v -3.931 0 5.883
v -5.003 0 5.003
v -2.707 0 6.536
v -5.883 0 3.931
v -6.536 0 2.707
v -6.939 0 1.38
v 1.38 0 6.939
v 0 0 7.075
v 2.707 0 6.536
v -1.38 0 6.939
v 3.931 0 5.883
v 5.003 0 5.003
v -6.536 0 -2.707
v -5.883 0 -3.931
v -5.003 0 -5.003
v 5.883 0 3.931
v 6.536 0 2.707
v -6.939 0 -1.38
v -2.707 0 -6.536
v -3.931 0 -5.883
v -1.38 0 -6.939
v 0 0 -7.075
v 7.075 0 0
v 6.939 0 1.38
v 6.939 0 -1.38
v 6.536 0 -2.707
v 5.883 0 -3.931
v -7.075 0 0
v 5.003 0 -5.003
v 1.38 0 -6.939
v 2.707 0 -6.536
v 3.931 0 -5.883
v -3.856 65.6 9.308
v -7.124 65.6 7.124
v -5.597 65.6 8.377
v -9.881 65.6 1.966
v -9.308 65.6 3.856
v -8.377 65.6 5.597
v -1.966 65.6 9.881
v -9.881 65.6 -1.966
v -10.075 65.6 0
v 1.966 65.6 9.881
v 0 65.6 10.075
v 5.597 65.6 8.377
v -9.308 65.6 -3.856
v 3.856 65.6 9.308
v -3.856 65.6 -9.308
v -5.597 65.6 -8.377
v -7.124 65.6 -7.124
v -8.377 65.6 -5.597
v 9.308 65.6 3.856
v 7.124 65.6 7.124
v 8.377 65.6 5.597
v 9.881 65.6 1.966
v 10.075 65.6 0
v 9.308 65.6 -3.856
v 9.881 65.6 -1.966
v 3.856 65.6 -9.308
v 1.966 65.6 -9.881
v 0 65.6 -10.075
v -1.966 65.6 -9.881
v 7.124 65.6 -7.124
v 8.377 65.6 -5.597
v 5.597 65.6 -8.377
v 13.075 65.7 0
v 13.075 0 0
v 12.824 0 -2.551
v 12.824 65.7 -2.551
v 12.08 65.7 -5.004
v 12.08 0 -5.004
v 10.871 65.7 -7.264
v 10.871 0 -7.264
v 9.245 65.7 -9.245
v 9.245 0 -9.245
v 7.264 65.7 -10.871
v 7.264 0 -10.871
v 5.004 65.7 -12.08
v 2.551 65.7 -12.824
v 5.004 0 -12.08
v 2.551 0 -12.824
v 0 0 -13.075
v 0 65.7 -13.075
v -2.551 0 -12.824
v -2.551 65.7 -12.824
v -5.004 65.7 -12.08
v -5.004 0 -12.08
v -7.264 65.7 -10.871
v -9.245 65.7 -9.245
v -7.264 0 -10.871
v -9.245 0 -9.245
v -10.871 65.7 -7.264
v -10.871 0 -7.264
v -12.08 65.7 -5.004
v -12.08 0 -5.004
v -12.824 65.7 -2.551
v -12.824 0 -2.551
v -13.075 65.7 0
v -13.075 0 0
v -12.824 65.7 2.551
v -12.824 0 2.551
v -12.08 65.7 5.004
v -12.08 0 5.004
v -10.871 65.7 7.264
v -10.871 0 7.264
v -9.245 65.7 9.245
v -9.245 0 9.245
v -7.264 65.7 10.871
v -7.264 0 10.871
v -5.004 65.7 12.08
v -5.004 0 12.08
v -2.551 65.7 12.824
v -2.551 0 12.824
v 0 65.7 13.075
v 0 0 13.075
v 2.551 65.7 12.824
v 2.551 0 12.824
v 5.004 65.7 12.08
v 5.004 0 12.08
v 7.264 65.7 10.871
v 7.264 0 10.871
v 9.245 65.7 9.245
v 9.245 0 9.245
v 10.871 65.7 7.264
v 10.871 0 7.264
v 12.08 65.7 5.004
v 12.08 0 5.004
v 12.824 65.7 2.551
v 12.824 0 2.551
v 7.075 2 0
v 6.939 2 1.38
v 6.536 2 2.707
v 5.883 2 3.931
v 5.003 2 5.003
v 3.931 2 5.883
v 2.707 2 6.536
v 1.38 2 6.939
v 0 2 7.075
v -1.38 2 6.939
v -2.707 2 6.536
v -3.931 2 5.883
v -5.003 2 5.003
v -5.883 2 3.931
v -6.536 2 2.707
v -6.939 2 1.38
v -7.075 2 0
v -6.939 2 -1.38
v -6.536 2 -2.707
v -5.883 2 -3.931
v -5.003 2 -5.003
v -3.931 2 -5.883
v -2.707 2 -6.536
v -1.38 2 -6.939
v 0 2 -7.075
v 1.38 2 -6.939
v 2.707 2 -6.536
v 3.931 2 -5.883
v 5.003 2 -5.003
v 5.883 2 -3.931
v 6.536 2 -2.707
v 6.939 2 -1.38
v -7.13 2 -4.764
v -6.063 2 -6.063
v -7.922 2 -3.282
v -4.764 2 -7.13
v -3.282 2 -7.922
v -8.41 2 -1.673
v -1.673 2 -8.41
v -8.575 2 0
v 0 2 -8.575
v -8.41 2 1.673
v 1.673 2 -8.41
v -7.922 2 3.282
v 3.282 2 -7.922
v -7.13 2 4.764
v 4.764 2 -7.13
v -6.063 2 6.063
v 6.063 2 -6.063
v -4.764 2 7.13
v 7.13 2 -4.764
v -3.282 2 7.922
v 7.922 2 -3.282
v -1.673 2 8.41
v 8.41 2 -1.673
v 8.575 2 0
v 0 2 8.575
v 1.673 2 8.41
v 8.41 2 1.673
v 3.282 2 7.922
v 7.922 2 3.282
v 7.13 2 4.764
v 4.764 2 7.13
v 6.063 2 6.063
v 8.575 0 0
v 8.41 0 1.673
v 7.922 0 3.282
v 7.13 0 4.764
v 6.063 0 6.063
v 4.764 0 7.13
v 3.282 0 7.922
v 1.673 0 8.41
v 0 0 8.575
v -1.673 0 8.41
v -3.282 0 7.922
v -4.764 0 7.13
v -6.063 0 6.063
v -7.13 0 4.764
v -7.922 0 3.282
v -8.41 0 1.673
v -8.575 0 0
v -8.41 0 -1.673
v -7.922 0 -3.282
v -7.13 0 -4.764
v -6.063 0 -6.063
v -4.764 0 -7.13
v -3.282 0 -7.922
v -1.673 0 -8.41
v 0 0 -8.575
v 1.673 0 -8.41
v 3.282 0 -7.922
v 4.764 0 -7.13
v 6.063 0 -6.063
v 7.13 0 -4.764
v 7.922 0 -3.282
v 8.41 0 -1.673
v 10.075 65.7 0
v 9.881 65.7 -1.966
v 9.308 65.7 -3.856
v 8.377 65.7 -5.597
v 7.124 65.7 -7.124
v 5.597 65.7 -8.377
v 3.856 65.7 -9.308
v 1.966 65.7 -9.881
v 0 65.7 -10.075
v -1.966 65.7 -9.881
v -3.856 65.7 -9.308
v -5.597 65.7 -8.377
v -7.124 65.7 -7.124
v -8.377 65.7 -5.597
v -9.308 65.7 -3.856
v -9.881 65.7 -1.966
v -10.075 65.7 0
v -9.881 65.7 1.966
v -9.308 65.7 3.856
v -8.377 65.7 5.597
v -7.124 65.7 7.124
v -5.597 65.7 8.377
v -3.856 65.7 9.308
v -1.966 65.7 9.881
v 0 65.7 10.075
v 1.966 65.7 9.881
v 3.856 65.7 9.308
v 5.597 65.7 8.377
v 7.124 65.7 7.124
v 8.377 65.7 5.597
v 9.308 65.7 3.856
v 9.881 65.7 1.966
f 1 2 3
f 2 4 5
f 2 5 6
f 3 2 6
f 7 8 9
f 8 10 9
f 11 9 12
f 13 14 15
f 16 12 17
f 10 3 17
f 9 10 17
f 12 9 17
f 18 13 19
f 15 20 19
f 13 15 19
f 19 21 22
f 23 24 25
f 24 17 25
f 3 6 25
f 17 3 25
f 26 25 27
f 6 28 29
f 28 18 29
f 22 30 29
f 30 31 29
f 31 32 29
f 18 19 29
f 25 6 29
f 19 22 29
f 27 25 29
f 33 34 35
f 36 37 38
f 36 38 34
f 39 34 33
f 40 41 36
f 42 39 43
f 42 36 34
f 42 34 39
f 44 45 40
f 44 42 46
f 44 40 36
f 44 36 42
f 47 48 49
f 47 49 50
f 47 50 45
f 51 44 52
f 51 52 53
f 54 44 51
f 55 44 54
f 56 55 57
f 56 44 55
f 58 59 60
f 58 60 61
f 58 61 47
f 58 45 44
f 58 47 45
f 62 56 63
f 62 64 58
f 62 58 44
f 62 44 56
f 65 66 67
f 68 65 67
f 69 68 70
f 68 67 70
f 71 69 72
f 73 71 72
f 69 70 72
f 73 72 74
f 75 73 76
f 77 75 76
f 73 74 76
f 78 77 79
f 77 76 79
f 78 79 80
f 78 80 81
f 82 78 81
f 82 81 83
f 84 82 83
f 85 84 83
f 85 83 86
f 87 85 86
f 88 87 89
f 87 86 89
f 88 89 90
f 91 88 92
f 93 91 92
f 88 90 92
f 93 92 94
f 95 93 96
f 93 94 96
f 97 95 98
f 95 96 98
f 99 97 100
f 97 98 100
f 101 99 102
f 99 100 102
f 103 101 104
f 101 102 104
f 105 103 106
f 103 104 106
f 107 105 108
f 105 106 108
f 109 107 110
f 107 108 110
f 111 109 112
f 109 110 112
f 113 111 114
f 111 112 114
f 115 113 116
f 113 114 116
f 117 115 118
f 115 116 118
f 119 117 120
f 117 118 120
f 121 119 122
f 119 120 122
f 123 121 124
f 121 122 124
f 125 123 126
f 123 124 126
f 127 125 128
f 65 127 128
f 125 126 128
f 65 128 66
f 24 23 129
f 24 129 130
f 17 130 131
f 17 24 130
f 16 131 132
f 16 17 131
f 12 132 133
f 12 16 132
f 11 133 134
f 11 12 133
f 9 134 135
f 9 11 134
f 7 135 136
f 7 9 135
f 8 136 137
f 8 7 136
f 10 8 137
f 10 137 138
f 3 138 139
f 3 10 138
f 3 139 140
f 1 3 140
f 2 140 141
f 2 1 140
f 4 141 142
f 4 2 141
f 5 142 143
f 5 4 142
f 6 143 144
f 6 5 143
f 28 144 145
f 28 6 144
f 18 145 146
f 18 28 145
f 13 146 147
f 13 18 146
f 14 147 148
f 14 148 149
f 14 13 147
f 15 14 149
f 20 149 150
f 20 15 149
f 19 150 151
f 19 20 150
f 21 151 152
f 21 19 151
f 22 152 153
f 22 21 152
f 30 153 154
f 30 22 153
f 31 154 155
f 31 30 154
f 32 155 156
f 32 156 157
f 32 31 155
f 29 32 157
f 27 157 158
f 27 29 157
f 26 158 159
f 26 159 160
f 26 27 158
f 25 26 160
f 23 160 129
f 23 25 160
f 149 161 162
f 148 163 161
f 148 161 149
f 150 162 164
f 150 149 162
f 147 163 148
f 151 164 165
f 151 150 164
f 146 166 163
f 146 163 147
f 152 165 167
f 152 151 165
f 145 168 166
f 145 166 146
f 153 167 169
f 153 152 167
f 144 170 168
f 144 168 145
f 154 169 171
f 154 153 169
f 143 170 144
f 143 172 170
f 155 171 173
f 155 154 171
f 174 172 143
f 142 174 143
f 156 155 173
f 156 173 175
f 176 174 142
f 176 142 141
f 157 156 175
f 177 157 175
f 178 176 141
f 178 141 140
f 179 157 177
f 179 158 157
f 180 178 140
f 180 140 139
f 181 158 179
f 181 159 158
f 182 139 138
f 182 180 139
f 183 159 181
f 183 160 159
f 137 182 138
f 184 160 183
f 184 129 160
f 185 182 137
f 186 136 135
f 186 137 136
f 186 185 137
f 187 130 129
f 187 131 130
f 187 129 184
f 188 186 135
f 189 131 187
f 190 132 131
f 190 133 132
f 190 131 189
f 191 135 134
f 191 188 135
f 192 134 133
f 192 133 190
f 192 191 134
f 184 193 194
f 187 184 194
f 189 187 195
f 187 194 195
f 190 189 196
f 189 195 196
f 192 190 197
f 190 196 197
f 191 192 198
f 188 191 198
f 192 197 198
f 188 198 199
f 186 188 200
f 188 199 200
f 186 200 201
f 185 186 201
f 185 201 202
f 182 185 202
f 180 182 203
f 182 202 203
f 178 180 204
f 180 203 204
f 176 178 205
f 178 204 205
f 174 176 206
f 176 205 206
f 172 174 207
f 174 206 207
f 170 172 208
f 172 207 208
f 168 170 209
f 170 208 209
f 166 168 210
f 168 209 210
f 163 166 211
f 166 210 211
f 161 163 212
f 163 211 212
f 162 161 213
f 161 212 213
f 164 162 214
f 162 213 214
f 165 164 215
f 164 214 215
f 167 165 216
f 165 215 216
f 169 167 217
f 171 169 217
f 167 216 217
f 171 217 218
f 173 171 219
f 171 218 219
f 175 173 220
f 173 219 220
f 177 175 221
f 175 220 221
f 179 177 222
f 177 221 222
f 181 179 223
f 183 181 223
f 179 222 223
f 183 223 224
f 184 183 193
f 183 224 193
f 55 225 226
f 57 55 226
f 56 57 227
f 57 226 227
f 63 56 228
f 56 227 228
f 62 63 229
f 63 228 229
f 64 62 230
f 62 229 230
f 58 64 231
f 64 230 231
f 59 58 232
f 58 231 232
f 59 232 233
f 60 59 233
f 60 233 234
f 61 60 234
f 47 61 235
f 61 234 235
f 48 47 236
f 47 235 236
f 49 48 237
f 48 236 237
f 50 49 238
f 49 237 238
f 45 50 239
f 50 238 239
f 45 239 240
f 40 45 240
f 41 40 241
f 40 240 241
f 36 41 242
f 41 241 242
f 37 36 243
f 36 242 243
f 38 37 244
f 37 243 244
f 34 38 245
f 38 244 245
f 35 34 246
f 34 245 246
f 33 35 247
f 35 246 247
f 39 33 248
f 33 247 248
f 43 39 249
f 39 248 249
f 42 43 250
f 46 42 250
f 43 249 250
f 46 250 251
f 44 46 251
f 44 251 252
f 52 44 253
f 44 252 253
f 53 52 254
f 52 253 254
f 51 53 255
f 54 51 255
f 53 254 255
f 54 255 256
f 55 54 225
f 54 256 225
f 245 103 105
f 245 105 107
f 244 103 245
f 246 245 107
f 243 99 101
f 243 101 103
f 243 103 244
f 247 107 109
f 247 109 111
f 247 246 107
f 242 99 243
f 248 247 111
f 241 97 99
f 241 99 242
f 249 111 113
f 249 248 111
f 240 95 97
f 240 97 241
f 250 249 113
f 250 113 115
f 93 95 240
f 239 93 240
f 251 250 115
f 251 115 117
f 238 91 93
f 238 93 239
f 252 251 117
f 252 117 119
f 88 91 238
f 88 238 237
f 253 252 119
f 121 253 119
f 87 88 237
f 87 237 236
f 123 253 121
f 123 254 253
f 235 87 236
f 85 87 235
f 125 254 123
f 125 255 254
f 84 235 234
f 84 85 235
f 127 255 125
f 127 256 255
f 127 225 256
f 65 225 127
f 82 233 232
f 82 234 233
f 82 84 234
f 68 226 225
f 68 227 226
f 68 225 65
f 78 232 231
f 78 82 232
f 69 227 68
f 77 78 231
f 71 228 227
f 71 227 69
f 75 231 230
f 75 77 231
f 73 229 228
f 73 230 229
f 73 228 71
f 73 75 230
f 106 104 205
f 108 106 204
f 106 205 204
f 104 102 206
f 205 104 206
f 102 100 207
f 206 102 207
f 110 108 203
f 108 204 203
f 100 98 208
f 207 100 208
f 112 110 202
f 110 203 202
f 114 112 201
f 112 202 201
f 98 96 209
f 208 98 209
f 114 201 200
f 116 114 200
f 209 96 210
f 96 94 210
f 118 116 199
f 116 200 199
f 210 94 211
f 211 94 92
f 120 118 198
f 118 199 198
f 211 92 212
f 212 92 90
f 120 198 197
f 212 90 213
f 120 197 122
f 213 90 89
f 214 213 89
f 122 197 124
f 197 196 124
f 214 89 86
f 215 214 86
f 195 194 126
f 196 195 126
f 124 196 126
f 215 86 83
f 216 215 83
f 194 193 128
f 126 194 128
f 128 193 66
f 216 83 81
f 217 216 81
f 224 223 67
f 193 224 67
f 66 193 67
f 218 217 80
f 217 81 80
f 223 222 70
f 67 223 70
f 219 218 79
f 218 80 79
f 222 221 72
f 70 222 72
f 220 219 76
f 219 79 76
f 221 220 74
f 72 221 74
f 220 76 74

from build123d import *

# Parameters (mm, degrees)
ESQUISSE1_R             = 13.075
BOSS_EXTRU_1_DEPTH      = 65.7
ESQUISSE2_R             = 10.075
ENL_V_MAT_EXTRU_1_DEPTH = 0.1
ESQUISSE3_R             = 8.575
ESQUISSE3_R_2           = 7.075
ENL_V_MAT_EXTRU_2_DEPTH = 2


with BuildPart() as part:
    # Esquisse1 → Boss.-Extru.1 (new body)
    with BuildSketch(Plane(origin=(0, 0, 0), x_dir=(1, 0, 0), z_dir=(0, 1, 0))):
        Circle(ESQUISSE1_R)
    extrude(amount=BOSS_EXTRU_1_DEPTH)

    # Esquisse2 → Enlèv. mat.-Extru.1 (cut)
    with BuildSketch(Plane(origin=(0, 65.7, 0), x_dir=(1, 0, 0), z_dir=(0, 1, 0))):
        Circle(ESQUISSE2_R)
    extrude(amount=-ENL_V_MAT_EXTRU_1_DEPTH, mode=Mode.SUBTRACT)

    # Esquisse3 → Enlèv. mat.-Extru.2 (cut)
    with BuildSketch(Plane.XZ):
        Circle(ESQUISSE3_R)
        Circle(ESQUISSE3_R_2, mode=Mode.SUBTRACT)
    extrude(amount=-ENL_V_MAT_EXTRU_2_DEPTH, mode=Mode.SUBTRACT)


solid = part.part
